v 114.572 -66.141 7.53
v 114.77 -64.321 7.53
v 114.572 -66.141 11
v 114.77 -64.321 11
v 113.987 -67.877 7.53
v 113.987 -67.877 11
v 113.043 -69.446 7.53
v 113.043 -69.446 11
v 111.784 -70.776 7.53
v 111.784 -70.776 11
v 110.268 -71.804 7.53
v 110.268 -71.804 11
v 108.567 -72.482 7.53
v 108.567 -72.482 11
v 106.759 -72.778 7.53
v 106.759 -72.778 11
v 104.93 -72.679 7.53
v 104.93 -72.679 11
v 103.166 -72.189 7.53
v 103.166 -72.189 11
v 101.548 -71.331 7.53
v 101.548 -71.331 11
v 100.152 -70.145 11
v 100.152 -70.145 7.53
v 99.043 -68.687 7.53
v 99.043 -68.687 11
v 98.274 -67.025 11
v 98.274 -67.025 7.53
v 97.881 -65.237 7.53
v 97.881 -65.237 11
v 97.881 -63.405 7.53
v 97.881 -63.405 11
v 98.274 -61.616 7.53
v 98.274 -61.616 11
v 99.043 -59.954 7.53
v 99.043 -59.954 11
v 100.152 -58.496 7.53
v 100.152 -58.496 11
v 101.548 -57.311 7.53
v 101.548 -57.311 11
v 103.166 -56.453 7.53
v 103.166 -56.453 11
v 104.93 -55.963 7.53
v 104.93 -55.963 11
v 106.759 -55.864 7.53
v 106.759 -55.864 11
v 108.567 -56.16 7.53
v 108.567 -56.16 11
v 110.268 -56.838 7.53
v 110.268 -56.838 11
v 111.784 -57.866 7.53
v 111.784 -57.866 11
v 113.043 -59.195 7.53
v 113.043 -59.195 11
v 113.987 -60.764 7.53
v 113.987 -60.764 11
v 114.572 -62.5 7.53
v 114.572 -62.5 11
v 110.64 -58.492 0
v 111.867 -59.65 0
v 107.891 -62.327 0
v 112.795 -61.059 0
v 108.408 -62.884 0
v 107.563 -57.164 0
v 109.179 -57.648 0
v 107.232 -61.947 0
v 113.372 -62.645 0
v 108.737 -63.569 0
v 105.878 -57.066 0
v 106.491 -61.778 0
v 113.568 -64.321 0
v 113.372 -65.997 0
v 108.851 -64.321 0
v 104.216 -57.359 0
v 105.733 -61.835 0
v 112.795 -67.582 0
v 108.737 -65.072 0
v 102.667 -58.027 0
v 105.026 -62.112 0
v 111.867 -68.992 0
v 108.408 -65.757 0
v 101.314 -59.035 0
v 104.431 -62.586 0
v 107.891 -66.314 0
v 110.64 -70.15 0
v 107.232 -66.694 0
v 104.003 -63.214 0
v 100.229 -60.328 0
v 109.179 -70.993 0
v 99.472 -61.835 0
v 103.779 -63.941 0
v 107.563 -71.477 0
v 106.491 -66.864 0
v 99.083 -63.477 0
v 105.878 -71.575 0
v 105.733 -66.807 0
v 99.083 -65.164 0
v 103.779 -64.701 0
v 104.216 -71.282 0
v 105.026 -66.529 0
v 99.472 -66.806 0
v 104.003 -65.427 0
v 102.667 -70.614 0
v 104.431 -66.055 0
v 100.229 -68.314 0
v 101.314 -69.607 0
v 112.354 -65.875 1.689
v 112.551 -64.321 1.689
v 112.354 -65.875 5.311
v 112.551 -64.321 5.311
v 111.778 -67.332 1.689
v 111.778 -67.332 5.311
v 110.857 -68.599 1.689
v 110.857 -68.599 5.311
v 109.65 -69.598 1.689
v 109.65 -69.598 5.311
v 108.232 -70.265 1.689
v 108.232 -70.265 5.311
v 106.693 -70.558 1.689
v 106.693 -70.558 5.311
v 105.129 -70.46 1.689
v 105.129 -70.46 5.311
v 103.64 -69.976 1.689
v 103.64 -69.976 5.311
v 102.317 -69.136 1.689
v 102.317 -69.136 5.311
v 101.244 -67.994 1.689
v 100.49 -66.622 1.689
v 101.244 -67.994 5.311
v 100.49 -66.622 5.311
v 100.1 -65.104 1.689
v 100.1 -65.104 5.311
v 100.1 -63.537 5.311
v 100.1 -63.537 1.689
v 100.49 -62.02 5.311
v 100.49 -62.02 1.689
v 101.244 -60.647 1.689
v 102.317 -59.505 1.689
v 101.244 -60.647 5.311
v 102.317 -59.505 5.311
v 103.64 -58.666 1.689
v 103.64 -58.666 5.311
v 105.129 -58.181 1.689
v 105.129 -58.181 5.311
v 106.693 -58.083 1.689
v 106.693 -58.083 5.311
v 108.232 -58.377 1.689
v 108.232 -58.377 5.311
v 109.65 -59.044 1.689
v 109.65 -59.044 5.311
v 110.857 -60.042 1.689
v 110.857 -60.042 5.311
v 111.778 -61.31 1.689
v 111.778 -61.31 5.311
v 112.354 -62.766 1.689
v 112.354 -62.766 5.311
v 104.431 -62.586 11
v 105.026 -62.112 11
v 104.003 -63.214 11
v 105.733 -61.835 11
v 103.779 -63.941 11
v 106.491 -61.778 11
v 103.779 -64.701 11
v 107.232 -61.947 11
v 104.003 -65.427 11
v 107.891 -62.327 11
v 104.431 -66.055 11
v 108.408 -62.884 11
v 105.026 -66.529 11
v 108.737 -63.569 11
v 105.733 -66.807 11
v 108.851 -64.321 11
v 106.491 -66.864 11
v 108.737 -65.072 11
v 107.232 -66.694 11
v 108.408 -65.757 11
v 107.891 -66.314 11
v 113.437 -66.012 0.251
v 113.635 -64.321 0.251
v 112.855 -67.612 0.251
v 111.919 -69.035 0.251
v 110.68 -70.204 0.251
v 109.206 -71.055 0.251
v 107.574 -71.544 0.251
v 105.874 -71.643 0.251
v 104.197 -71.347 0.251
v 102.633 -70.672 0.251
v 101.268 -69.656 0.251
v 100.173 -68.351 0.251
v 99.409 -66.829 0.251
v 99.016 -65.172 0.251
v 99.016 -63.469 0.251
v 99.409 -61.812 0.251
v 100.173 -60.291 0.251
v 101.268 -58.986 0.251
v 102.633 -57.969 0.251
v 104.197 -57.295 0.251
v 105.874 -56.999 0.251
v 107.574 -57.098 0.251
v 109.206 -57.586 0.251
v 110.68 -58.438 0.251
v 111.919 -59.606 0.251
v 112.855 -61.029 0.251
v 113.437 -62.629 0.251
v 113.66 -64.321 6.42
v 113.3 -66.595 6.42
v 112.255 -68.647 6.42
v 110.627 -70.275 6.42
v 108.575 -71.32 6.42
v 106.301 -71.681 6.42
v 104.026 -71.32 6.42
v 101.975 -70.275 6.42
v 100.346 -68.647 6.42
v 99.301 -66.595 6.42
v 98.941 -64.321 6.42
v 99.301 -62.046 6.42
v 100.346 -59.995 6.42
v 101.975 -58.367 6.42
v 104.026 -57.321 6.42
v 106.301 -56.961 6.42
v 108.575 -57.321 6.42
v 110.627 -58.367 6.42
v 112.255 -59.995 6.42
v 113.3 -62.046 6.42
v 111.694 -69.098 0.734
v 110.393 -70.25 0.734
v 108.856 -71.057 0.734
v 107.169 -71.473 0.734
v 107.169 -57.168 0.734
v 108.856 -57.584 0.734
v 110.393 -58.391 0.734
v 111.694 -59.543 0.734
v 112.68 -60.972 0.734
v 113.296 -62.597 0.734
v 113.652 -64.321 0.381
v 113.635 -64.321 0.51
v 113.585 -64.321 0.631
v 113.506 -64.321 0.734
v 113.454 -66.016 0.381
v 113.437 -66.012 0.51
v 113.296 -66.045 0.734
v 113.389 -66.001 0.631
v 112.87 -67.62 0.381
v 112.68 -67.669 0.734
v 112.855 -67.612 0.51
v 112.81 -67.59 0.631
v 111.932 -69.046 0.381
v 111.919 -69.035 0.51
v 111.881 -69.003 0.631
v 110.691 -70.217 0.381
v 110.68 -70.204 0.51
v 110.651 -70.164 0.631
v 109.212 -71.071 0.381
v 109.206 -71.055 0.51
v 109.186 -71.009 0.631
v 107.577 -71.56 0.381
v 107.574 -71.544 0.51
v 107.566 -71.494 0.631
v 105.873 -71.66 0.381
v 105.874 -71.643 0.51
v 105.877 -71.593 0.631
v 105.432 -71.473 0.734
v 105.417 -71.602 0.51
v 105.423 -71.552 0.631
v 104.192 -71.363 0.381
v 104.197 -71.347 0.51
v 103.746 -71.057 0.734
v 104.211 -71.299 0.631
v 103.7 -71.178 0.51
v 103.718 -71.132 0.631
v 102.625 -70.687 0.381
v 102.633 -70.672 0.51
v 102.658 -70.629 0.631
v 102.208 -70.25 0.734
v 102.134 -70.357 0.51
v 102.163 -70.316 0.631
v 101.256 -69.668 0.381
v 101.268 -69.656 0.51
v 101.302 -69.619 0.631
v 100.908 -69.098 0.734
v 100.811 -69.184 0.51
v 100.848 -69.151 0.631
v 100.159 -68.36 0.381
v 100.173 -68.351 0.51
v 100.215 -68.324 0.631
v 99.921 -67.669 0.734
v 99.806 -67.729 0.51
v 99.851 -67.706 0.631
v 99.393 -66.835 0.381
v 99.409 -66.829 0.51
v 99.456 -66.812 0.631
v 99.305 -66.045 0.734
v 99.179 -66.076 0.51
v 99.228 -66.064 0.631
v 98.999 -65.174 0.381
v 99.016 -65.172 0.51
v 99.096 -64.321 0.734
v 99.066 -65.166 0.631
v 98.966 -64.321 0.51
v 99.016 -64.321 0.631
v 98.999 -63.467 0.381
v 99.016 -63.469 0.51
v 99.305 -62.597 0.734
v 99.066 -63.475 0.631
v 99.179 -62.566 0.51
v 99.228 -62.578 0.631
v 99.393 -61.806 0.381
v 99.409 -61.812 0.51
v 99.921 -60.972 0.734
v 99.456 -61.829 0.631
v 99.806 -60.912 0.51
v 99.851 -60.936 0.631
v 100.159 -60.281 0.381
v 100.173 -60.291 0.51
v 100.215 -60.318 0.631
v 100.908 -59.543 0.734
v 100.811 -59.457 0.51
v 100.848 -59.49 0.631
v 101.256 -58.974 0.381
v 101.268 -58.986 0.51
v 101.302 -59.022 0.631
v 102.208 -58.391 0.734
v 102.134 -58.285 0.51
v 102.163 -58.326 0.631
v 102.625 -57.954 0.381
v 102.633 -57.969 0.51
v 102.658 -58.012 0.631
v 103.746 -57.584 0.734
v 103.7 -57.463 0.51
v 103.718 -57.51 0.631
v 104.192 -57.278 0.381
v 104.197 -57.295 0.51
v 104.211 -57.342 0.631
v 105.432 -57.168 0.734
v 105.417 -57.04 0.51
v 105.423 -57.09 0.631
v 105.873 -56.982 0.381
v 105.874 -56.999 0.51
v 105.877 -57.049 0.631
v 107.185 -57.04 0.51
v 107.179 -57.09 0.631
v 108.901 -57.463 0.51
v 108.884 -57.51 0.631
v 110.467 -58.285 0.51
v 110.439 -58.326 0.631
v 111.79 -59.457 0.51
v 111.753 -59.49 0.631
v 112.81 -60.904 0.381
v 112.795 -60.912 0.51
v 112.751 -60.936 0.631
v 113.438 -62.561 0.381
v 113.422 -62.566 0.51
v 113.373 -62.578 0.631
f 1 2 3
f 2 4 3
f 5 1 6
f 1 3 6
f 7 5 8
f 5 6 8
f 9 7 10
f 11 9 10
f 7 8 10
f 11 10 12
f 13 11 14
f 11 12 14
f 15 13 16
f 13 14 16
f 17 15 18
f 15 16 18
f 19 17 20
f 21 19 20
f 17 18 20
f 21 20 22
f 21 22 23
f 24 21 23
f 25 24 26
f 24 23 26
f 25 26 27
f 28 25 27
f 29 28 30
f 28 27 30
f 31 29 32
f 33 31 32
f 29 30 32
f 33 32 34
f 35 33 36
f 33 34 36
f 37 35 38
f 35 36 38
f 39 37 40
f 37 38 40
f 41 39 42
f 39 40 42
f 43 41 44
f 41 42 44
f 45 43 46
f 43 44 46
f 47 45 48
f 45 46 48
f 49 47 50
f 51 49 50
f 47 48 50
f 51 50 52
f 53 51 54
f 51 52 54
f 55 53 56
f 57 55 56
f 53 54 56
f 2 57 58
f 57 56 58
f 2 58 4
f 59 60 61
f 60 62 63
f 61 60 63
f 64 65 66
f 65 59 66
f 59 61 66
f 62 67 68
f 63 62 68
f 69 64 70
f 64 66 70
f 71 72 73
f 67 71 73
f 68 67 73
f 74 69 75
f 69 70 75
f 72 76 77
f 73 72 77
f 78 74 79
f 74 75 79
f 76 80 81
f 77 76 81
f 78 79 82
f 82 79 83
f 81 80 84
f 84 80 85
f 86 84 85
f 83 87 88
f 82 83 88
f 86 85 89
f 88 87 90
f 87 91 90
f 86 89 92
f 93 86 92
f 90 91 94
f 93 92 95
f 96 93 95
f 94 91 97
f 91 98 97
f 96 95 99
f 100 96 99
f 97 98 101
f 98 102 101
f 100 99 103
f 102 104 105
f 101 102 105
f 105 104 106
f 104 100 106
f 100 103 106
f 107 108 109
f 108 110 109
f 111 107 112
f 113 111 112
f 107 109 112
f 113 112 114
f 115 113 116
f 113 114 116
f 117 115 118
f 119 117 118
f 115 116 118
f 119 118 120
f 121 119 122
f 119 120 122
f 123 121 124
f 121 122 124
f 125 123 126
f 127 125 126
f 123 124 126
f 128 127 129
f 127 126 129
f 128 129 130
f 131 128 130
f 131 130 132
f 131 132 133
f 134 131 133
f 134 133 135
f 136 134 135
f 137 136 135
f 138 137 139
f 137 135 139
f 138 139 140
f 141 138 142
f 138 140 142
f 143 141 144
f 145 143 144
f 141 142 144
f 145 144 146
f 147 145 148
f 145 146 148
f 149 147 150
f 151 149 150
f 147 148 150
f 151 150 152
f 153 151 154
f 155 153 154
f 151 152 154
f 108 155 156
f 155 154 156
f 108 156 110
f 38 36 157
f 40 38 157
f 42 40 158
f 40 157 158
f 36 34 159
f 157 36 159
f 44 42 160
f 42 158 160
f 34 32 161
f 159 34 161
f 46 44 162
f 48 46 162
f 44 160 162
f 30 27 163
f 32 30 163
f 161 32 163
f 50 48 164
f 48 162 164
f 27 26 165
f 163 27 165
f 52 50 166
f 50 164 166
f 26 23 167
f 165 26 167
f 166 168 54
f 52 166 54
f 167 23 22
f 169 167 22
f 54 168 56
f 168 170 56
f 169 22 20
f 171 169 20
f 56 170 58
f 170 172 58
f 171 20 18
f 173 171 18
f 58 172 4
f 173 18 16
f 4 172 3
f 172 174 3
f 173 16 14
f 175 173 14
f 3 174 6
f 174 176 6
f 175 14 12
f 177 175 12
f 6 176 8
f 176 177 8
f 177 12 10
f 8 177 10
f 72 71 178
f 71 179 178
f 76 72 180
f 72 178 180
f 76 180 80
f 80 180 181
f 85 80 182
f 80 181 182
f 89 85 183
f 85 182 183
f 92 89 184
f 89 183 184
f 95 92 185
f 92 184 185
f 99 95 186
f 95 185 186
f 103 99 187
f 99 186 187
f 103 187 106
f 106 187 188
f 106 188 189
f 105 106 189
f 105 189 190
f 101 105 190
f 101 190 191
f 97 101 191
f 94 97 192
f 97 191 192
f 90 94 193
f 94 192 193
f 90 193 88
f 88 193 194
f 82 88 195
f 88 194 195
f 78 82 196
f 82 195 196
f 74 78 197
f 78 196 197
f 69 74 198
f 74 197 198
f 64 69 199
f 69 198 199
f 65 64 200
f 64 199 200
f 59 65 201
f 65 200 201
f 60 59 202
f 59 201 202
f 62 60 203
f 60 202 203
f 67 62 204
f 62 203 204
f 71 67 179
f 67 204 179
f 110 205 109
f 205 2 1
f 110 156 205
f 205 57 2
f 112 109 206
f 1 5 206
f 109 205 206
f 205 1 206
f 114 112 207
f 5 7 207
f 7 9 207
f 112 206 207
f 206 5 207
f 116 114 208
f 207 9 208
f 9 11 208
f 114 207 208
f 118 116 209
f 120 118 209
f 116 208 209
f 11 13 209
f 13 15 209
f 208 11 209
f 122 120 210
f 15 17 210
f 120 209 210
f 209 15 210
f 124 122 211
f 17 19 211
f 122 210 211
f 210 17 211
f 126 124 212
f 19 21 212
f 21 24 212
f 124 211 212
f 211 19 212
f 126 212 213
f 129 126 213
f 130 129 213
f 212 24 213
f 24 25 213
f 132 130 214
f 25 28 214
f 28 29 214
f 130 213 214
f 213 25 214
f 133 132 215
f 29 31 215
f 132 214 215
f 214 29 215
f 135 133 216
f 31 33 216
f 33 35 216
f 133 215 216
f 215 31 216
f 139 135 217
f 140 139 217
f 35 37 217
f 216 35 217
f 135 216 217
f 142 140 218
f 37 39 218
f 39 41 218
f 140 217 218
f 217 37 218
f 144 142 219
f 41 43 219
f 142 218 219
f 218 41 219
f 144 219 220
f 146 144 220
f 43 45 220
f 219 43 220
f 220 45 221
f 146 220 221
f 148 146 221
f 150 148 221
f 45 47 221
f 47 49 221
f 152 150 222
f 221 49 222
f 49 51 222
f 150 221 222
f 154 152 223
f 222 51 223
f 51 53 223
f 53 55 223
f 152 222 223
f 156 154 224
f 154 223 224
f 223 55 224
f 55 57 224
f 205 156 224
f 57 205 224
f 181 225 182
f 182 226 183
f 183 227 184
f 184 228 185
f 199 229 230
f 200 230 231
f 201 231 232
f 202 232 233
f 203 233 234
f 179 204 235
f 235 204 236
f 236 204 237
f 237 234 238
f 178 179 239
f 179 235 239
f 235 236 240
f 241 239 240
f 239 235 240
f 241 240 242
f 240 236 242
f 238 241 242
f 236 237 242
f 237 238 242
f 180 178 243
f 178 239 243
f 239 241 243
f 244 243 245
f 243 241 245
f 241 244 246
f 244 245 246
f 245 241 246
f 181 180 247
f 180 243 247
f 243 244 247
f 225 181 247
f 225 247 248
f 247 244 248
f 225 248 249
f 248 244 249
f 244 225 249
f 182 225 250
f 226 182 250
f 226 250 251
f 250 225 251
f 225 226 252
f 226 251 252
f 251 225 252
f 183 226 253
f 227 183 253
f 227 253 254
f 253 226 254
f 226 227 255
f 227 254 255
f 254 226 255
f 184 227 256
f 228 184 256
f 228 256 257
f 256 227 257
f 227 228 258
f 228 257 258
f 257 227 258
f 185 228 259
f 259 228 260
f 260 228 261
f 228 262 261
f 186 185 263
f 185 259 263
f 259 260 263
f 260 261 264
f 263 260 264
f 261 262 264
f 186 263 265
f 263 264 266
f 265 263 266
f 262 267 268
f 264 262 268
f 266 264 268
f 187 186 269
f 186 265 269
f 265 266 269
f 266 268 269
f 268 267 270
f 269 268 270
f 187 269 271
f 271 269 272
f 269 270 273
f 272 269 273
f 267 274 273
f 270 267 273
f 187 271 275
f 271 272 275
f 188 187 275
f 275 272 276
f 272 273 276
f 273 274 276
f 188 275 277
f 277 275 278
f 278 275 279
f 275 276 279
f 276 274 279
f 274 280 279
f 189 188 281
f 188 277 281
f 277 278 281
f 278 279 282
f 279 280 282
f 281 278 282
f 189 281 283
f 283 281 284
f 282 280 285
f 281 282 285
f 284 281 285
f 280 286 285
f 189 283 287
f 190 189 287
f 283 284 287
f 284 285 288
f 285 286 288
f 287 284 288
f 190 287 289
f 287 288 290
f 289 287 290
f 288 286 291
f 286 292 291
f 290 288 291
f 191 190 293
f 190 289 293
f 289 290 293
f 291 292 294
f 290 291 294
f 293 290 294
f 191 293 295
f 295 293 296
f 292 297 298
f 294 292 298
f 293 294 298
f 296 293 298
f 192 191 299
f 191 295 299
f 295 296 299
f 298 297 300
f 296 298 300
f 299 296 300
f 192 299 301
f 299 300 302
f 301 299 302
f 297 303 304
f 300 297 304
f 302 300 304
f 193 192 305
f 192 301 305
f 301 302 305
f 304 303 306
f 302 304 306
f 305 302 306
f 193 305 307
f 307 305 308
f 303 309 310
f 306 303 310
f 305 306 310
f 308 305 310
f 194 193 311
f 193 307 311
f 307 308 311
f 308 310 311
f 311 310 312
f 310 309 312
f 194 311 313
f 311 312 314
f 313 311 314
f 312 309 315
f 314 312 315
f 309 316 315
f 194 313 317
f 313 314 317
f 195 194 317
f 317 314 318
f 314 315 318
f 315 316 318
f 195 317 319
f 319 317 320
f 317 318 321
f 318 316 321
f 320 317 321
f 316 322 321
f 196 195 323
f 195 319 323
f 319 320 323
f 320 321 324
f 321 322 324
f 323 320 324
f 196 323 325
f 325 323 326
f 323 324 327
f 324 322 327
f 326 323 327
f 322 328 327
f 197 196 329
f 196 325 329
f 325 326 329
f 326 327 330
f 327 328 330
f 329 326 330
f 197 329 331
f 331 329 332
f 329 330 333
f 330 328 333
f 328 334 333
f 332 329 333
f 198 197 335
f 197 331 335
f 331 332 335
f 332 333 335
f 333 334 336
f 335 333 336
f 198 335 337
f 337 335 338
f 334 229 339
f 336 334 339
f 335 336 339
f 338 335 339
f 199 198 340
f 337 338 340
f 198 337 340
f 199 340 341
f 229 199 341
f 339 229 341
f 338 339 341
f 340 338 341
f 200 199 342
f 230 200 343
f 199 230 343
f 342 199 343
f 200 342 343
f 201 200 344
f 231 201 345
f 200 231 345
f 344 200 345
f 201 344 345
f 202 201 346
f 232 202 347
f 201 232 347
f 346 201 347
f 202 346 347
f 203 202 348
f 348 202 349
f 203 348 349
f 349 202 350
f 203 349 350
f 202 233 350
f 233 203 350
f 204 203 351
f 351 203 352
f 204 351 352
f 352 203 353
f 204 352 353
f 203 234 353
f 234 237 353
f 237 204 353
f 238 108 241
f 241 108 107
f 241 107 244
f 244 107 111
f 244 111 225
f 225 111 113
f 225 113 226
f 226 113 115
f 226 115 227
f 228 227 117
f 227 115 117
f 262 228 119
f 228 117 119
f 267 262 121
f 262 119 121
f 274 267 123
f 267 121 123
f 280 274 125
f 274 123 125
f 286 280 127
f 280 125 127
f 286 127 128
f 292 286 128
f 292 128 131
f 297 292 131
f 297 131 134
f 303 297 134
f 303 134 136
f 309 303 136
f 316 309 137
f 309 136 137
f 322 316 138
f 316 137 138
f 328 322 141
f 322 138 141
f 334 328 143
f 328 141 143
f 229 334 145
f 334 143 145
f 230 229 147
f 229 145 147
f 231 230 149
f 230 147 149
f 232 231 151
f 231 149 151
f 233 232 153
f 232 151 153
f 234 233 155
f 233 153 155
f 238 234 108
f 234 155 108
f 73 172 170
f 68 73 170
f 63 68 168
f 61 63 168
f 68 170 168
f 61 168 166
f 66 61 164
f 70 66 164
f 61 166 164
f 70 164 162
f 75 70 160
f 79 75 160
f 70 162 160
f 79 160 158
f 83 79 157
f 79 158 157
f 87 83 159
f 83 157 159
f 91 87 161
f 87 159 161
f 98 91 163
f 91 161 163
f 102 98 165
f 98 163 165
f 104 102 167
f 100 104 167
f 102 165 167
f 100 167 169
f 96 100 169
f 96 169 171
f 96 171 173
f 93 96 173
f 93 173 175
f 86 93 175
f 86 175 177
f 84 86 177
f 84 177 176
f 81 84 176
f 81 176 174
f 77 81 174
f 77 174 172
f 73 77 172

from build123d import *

# Parameters (mm, degrees)
F_5_1_5_1_DIAMETER_HOLE1_D = 5.1


with BuildPart() as part:
    # Sketch1 → Revolve1 (revolve)
    with BuildSketch(Plane.XZ.offset(64.320770854)):
        with BuildLine():
            Line((114.770297578, 11), (106.300627664, 11))
            Line((106.300627664, 11), (106.300627664, 0))
            Line((106.300627664, 0), (113.567535888, 0))
            Line((113.567535888, 0), (113.634922783, 0.251491318))
            ThreePointArc((113.634922783, 0.251491318), (113.634922783, 0.510310363), (113.505513261, 0.734454231))
            Line((113.505513261, 0.734454231), (112.550627664, 1.689339828))
            Line((112.550627664, 1.689339828), (112.550627664, 5.310660172))
            Line((112.550627664, 5.310660172), (114.770297578, 7.530330086))
            Line((114.770297578, 7.530330086), (114.770297578, 11))
        make_face()
    revolve(axis=Axis((106.300627664, -64.320770854, 11), (0, 0, -1)))

    # Ø5.1 (5.1) Diameter Hole1 (through all)
    with Locations(Plane(origin=(0, 0, 0), x_dir=(-1, 0, 0), z_dir=(0, 0, -1))):
        with Locations((-106.300627664, -64.320770854)):
            Hole(F_5_1_5_1_DIAMETER_HOLE1_D / 2)


solid = part.part
